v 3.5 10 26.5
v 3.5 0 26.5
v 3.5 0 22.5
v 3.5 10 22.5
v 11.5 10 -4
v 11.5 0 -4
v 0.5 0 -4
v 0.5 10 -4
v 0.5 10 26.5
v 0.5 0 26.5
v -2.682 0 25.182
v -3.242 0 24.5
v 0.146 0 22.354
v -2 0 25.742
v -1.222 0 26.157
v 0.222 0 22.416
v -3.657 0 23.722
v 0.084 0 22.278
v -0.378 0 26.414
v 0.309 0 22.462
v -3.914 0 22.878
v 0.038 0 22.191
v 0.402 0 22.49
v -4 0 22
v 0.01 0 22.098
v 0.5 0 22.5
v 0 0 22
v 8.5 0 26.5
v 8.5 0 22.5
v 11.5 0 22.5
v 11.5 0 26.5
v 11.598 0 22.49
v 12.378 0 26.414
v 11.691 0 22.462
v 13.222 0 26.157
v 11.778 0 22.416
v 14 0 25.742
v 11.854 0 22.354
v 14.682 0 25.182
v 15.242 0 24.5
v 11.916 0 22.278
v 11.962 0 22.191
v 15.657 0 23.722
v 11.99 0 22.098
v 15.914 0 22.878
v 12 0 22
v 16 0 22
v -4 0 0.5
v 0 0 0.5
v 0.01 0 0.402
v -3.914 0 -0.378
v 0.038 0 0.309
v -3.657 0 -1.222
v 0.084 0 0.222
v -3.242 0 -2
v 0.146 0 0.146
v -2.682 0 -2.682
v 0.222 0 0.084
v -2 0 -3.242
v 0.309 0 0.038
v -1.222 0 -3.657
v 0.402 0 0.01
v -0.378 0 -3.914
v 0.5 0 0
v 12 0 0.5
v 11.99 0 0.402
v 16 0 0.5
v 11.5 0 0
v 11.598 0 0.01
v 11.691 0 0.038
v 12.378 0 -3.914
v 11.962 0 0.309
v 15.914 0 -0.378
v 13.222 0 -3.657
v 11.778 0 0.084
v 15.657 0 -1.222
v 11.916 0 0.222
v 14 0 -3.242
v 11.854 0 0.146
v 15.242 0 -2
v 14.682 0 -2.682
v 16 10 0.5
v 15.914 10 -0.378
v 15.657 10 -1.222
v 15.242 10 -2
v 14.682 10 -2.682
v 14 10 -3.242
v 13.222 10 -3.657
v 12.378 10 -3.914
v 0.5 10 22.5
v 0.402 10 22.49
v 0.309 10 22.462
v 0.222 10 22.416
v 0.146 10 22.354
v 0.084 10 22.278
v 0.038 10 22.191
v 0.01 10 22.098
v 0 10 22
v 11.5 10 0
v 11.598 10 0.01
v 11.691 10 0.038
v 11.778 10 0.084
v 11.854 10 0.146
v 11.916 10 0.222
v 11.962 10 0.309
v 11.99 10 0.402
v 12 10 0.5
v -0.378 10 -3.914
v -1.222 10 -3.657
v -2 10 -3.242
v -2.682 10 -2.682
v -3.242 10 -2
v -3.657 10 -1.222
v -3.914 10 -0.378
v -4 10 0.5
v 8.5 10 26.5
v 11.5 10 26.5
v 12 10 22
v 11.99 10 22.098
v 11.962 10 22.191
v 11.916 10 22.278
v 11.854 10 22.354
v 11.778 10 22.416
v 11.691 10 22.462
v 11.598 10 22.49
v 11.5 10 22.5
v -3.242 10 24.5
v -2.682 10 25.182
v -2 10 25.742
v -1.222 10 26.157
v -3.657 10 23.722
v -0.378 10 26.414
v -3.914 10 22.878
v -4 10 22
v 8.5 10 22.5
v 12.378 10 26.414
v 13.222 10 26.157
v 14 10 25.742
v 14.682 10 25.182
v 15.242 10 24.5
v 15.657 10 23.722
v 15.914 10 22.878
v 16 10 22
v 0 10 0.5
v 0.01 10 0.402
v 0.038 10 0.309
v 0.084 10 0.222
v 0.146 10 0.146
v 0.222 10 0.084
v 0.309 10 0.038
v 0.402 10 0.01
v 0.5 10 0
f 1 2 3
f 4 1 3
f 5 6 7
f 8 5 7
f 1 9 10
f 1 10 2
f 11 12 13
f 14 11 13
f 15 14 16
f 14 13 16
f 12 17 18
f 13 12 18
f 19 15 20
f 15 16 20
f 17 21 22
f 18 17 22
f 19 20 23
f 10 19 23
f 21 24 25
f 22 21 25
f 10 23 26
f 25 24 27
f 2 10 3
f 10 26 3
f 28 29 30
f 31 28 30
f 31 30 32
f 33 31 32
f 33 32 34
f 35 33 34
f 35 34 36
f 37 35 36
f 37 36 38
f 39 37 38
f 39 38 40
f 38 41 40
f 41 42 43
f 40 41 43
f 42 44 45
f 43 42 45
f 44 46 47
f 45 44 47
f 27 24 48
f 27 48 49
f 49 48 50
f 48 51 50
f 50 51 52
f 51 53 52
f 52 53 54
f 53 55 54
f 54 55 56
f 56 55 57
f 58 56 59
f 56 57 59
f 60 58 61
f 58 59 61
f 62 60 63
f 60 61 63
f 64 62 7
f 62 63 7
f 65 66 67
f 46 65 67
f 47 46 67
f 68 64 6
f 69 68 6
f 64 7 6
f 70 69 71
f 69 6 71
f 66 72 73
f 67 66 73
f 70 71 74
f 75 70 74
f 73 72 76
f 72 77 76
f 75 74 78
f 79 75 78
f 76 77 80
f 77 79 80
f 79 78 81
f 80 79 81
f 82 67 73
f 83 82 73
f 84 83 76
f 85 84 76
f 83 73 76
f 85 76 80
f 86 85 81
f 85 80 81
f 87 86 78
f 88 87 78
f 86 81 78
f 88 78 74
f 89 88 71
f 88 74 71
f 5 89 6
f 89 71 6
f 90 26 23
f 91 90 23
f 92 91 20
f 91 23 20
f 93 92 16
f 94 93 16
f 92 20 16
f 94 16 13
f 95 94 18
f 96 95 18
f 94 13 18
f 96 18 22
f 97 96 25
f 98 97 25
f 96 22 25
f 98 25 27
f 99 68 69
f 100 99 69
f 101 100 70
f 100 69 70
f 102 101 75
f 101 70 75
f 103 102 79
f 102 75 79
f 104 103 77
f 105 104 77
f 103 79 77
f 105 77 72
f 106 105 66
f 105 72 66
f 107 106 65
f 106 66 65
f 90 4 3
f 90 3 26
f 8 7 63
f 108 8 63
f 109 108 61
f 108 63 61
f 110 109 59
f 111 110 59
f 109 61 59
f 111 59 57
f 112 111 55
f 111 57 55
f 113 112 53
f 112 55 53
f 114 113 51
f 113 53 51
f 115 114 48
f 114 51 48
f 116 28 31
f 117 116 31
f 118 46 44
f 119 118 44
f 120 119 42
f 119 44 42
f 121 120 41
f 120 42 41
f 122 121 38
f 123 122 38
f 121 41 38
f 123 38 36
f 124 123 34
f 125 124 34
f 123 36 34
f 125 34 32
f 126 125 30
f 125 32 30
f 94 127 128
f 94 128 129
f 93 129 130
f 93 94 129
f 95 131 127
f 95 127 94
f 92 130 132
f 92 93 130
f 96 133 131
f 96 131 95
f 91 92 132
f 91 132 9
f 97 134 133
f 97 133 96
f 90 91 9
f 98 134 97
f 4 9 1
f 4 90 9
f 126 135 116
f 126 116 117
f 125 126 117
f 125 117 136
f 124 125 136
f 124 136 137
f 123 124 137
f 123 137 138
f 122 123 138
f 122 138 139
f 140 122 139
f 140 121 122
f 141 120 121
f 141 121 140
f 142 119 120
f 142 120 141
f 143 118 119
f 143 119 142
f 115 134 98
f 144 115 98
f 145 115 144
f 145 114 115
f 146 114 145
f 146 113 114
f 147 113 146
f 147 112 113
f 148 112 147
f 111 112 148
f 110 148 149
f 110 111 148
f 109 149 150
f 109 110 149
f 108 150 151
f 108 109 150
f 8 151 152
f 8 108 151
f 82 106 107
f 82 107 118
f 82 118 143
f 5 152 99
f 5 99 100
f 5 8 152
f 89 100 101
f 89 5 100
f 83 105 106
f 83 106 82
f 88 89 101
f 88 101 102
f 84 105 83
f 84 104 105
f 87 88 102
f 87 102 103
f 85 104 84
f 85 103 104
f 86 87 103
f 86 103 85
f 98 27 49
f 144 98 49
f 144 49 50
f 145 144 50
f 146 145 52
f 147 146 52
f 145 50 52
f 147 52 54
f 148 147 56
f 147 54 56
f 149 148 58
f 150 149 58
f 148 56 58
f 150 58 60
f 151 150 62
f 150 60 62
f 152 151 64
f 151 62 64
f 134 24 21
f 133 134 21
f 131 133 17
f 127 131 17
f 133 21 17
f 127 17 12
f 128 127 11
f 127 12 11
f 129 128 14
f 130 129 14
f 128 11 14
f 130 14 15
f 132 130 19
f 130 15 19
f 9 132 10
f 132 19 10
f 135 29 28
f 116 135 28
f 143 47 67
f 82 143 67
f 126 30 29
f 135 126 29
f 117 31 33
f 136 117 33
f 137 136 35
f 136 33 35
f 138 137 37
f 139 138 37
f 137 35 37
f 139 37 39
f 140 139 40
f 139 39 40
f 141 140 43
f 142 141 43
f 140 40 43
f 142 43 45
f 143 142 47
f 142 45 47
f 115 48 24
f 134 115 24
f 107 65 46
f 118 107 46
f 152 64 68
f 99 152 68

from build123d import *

# Parameters (mm, degrees)
BOSS_EXTRUDE1_DEPTH = 10


with BuildPart() as part:
    # Sketch1 → Boss-Extrude1 (new body)
    with BuildSketch(Plane(origin=(0, 0, 0), x_dir=(1, 0, 0), z_dir=(0, 1, 0))):
        with BuildLine():
            Line((-4, -0.5), (-4, -22))
            ThreePointArc((-4, -22), (-2.681980515, -25.181980515), (0.5, -26.5))
            Line((0.5, -26.5), (3.5, -26.5))
            Line((3.5, -26.5), (3.5, -22.5))
            Line((3.5, -22.5), (0.5, -22.5))
            ThreePointArc((0.5, -22.5), (0.146446609, -22.353553391), (0, -22))
            Line((0, -22), (0, -0.5))
            ThreePointArc((0, -0.5), (0.146446609, -0.146446609), (0.5, 0))
            Line((0.5, 0), (11.5, 0))
            ThreePointArc((11.5, 0), (11.853553391, -0.146446609), (12, -0.5))
            Line((12, -0.5), (12, -22))
            ThreePointArc((12, -22), (11.853553391, -22.353553391), (11.5, -22.5))
            Line((11.5, -22.5), (8.5, -22.5))
            Line((8.5, -22.5), (8.5, -26.5))
            Line((8.5, -26.5), (11.5, -26.5))
            ThreePointArc((11.5, -26.5), (14.681980515, -25.181980515), (16, -22))
            Line((16, -22), (16, -0.5))
            ThreePointArc((16, -0.5), (14.681980515, 2.681980515), (11.5, 4))
            Line((11.5, 4), (0.5, 4))
            ThreePointArc((0.5, 4), (-2.681980515, 2.681980515), (-4, -0.5))
        make_face()
    extrude(amount=BOSS_EXTRUDE1_DEPTH)


solid = part.part
